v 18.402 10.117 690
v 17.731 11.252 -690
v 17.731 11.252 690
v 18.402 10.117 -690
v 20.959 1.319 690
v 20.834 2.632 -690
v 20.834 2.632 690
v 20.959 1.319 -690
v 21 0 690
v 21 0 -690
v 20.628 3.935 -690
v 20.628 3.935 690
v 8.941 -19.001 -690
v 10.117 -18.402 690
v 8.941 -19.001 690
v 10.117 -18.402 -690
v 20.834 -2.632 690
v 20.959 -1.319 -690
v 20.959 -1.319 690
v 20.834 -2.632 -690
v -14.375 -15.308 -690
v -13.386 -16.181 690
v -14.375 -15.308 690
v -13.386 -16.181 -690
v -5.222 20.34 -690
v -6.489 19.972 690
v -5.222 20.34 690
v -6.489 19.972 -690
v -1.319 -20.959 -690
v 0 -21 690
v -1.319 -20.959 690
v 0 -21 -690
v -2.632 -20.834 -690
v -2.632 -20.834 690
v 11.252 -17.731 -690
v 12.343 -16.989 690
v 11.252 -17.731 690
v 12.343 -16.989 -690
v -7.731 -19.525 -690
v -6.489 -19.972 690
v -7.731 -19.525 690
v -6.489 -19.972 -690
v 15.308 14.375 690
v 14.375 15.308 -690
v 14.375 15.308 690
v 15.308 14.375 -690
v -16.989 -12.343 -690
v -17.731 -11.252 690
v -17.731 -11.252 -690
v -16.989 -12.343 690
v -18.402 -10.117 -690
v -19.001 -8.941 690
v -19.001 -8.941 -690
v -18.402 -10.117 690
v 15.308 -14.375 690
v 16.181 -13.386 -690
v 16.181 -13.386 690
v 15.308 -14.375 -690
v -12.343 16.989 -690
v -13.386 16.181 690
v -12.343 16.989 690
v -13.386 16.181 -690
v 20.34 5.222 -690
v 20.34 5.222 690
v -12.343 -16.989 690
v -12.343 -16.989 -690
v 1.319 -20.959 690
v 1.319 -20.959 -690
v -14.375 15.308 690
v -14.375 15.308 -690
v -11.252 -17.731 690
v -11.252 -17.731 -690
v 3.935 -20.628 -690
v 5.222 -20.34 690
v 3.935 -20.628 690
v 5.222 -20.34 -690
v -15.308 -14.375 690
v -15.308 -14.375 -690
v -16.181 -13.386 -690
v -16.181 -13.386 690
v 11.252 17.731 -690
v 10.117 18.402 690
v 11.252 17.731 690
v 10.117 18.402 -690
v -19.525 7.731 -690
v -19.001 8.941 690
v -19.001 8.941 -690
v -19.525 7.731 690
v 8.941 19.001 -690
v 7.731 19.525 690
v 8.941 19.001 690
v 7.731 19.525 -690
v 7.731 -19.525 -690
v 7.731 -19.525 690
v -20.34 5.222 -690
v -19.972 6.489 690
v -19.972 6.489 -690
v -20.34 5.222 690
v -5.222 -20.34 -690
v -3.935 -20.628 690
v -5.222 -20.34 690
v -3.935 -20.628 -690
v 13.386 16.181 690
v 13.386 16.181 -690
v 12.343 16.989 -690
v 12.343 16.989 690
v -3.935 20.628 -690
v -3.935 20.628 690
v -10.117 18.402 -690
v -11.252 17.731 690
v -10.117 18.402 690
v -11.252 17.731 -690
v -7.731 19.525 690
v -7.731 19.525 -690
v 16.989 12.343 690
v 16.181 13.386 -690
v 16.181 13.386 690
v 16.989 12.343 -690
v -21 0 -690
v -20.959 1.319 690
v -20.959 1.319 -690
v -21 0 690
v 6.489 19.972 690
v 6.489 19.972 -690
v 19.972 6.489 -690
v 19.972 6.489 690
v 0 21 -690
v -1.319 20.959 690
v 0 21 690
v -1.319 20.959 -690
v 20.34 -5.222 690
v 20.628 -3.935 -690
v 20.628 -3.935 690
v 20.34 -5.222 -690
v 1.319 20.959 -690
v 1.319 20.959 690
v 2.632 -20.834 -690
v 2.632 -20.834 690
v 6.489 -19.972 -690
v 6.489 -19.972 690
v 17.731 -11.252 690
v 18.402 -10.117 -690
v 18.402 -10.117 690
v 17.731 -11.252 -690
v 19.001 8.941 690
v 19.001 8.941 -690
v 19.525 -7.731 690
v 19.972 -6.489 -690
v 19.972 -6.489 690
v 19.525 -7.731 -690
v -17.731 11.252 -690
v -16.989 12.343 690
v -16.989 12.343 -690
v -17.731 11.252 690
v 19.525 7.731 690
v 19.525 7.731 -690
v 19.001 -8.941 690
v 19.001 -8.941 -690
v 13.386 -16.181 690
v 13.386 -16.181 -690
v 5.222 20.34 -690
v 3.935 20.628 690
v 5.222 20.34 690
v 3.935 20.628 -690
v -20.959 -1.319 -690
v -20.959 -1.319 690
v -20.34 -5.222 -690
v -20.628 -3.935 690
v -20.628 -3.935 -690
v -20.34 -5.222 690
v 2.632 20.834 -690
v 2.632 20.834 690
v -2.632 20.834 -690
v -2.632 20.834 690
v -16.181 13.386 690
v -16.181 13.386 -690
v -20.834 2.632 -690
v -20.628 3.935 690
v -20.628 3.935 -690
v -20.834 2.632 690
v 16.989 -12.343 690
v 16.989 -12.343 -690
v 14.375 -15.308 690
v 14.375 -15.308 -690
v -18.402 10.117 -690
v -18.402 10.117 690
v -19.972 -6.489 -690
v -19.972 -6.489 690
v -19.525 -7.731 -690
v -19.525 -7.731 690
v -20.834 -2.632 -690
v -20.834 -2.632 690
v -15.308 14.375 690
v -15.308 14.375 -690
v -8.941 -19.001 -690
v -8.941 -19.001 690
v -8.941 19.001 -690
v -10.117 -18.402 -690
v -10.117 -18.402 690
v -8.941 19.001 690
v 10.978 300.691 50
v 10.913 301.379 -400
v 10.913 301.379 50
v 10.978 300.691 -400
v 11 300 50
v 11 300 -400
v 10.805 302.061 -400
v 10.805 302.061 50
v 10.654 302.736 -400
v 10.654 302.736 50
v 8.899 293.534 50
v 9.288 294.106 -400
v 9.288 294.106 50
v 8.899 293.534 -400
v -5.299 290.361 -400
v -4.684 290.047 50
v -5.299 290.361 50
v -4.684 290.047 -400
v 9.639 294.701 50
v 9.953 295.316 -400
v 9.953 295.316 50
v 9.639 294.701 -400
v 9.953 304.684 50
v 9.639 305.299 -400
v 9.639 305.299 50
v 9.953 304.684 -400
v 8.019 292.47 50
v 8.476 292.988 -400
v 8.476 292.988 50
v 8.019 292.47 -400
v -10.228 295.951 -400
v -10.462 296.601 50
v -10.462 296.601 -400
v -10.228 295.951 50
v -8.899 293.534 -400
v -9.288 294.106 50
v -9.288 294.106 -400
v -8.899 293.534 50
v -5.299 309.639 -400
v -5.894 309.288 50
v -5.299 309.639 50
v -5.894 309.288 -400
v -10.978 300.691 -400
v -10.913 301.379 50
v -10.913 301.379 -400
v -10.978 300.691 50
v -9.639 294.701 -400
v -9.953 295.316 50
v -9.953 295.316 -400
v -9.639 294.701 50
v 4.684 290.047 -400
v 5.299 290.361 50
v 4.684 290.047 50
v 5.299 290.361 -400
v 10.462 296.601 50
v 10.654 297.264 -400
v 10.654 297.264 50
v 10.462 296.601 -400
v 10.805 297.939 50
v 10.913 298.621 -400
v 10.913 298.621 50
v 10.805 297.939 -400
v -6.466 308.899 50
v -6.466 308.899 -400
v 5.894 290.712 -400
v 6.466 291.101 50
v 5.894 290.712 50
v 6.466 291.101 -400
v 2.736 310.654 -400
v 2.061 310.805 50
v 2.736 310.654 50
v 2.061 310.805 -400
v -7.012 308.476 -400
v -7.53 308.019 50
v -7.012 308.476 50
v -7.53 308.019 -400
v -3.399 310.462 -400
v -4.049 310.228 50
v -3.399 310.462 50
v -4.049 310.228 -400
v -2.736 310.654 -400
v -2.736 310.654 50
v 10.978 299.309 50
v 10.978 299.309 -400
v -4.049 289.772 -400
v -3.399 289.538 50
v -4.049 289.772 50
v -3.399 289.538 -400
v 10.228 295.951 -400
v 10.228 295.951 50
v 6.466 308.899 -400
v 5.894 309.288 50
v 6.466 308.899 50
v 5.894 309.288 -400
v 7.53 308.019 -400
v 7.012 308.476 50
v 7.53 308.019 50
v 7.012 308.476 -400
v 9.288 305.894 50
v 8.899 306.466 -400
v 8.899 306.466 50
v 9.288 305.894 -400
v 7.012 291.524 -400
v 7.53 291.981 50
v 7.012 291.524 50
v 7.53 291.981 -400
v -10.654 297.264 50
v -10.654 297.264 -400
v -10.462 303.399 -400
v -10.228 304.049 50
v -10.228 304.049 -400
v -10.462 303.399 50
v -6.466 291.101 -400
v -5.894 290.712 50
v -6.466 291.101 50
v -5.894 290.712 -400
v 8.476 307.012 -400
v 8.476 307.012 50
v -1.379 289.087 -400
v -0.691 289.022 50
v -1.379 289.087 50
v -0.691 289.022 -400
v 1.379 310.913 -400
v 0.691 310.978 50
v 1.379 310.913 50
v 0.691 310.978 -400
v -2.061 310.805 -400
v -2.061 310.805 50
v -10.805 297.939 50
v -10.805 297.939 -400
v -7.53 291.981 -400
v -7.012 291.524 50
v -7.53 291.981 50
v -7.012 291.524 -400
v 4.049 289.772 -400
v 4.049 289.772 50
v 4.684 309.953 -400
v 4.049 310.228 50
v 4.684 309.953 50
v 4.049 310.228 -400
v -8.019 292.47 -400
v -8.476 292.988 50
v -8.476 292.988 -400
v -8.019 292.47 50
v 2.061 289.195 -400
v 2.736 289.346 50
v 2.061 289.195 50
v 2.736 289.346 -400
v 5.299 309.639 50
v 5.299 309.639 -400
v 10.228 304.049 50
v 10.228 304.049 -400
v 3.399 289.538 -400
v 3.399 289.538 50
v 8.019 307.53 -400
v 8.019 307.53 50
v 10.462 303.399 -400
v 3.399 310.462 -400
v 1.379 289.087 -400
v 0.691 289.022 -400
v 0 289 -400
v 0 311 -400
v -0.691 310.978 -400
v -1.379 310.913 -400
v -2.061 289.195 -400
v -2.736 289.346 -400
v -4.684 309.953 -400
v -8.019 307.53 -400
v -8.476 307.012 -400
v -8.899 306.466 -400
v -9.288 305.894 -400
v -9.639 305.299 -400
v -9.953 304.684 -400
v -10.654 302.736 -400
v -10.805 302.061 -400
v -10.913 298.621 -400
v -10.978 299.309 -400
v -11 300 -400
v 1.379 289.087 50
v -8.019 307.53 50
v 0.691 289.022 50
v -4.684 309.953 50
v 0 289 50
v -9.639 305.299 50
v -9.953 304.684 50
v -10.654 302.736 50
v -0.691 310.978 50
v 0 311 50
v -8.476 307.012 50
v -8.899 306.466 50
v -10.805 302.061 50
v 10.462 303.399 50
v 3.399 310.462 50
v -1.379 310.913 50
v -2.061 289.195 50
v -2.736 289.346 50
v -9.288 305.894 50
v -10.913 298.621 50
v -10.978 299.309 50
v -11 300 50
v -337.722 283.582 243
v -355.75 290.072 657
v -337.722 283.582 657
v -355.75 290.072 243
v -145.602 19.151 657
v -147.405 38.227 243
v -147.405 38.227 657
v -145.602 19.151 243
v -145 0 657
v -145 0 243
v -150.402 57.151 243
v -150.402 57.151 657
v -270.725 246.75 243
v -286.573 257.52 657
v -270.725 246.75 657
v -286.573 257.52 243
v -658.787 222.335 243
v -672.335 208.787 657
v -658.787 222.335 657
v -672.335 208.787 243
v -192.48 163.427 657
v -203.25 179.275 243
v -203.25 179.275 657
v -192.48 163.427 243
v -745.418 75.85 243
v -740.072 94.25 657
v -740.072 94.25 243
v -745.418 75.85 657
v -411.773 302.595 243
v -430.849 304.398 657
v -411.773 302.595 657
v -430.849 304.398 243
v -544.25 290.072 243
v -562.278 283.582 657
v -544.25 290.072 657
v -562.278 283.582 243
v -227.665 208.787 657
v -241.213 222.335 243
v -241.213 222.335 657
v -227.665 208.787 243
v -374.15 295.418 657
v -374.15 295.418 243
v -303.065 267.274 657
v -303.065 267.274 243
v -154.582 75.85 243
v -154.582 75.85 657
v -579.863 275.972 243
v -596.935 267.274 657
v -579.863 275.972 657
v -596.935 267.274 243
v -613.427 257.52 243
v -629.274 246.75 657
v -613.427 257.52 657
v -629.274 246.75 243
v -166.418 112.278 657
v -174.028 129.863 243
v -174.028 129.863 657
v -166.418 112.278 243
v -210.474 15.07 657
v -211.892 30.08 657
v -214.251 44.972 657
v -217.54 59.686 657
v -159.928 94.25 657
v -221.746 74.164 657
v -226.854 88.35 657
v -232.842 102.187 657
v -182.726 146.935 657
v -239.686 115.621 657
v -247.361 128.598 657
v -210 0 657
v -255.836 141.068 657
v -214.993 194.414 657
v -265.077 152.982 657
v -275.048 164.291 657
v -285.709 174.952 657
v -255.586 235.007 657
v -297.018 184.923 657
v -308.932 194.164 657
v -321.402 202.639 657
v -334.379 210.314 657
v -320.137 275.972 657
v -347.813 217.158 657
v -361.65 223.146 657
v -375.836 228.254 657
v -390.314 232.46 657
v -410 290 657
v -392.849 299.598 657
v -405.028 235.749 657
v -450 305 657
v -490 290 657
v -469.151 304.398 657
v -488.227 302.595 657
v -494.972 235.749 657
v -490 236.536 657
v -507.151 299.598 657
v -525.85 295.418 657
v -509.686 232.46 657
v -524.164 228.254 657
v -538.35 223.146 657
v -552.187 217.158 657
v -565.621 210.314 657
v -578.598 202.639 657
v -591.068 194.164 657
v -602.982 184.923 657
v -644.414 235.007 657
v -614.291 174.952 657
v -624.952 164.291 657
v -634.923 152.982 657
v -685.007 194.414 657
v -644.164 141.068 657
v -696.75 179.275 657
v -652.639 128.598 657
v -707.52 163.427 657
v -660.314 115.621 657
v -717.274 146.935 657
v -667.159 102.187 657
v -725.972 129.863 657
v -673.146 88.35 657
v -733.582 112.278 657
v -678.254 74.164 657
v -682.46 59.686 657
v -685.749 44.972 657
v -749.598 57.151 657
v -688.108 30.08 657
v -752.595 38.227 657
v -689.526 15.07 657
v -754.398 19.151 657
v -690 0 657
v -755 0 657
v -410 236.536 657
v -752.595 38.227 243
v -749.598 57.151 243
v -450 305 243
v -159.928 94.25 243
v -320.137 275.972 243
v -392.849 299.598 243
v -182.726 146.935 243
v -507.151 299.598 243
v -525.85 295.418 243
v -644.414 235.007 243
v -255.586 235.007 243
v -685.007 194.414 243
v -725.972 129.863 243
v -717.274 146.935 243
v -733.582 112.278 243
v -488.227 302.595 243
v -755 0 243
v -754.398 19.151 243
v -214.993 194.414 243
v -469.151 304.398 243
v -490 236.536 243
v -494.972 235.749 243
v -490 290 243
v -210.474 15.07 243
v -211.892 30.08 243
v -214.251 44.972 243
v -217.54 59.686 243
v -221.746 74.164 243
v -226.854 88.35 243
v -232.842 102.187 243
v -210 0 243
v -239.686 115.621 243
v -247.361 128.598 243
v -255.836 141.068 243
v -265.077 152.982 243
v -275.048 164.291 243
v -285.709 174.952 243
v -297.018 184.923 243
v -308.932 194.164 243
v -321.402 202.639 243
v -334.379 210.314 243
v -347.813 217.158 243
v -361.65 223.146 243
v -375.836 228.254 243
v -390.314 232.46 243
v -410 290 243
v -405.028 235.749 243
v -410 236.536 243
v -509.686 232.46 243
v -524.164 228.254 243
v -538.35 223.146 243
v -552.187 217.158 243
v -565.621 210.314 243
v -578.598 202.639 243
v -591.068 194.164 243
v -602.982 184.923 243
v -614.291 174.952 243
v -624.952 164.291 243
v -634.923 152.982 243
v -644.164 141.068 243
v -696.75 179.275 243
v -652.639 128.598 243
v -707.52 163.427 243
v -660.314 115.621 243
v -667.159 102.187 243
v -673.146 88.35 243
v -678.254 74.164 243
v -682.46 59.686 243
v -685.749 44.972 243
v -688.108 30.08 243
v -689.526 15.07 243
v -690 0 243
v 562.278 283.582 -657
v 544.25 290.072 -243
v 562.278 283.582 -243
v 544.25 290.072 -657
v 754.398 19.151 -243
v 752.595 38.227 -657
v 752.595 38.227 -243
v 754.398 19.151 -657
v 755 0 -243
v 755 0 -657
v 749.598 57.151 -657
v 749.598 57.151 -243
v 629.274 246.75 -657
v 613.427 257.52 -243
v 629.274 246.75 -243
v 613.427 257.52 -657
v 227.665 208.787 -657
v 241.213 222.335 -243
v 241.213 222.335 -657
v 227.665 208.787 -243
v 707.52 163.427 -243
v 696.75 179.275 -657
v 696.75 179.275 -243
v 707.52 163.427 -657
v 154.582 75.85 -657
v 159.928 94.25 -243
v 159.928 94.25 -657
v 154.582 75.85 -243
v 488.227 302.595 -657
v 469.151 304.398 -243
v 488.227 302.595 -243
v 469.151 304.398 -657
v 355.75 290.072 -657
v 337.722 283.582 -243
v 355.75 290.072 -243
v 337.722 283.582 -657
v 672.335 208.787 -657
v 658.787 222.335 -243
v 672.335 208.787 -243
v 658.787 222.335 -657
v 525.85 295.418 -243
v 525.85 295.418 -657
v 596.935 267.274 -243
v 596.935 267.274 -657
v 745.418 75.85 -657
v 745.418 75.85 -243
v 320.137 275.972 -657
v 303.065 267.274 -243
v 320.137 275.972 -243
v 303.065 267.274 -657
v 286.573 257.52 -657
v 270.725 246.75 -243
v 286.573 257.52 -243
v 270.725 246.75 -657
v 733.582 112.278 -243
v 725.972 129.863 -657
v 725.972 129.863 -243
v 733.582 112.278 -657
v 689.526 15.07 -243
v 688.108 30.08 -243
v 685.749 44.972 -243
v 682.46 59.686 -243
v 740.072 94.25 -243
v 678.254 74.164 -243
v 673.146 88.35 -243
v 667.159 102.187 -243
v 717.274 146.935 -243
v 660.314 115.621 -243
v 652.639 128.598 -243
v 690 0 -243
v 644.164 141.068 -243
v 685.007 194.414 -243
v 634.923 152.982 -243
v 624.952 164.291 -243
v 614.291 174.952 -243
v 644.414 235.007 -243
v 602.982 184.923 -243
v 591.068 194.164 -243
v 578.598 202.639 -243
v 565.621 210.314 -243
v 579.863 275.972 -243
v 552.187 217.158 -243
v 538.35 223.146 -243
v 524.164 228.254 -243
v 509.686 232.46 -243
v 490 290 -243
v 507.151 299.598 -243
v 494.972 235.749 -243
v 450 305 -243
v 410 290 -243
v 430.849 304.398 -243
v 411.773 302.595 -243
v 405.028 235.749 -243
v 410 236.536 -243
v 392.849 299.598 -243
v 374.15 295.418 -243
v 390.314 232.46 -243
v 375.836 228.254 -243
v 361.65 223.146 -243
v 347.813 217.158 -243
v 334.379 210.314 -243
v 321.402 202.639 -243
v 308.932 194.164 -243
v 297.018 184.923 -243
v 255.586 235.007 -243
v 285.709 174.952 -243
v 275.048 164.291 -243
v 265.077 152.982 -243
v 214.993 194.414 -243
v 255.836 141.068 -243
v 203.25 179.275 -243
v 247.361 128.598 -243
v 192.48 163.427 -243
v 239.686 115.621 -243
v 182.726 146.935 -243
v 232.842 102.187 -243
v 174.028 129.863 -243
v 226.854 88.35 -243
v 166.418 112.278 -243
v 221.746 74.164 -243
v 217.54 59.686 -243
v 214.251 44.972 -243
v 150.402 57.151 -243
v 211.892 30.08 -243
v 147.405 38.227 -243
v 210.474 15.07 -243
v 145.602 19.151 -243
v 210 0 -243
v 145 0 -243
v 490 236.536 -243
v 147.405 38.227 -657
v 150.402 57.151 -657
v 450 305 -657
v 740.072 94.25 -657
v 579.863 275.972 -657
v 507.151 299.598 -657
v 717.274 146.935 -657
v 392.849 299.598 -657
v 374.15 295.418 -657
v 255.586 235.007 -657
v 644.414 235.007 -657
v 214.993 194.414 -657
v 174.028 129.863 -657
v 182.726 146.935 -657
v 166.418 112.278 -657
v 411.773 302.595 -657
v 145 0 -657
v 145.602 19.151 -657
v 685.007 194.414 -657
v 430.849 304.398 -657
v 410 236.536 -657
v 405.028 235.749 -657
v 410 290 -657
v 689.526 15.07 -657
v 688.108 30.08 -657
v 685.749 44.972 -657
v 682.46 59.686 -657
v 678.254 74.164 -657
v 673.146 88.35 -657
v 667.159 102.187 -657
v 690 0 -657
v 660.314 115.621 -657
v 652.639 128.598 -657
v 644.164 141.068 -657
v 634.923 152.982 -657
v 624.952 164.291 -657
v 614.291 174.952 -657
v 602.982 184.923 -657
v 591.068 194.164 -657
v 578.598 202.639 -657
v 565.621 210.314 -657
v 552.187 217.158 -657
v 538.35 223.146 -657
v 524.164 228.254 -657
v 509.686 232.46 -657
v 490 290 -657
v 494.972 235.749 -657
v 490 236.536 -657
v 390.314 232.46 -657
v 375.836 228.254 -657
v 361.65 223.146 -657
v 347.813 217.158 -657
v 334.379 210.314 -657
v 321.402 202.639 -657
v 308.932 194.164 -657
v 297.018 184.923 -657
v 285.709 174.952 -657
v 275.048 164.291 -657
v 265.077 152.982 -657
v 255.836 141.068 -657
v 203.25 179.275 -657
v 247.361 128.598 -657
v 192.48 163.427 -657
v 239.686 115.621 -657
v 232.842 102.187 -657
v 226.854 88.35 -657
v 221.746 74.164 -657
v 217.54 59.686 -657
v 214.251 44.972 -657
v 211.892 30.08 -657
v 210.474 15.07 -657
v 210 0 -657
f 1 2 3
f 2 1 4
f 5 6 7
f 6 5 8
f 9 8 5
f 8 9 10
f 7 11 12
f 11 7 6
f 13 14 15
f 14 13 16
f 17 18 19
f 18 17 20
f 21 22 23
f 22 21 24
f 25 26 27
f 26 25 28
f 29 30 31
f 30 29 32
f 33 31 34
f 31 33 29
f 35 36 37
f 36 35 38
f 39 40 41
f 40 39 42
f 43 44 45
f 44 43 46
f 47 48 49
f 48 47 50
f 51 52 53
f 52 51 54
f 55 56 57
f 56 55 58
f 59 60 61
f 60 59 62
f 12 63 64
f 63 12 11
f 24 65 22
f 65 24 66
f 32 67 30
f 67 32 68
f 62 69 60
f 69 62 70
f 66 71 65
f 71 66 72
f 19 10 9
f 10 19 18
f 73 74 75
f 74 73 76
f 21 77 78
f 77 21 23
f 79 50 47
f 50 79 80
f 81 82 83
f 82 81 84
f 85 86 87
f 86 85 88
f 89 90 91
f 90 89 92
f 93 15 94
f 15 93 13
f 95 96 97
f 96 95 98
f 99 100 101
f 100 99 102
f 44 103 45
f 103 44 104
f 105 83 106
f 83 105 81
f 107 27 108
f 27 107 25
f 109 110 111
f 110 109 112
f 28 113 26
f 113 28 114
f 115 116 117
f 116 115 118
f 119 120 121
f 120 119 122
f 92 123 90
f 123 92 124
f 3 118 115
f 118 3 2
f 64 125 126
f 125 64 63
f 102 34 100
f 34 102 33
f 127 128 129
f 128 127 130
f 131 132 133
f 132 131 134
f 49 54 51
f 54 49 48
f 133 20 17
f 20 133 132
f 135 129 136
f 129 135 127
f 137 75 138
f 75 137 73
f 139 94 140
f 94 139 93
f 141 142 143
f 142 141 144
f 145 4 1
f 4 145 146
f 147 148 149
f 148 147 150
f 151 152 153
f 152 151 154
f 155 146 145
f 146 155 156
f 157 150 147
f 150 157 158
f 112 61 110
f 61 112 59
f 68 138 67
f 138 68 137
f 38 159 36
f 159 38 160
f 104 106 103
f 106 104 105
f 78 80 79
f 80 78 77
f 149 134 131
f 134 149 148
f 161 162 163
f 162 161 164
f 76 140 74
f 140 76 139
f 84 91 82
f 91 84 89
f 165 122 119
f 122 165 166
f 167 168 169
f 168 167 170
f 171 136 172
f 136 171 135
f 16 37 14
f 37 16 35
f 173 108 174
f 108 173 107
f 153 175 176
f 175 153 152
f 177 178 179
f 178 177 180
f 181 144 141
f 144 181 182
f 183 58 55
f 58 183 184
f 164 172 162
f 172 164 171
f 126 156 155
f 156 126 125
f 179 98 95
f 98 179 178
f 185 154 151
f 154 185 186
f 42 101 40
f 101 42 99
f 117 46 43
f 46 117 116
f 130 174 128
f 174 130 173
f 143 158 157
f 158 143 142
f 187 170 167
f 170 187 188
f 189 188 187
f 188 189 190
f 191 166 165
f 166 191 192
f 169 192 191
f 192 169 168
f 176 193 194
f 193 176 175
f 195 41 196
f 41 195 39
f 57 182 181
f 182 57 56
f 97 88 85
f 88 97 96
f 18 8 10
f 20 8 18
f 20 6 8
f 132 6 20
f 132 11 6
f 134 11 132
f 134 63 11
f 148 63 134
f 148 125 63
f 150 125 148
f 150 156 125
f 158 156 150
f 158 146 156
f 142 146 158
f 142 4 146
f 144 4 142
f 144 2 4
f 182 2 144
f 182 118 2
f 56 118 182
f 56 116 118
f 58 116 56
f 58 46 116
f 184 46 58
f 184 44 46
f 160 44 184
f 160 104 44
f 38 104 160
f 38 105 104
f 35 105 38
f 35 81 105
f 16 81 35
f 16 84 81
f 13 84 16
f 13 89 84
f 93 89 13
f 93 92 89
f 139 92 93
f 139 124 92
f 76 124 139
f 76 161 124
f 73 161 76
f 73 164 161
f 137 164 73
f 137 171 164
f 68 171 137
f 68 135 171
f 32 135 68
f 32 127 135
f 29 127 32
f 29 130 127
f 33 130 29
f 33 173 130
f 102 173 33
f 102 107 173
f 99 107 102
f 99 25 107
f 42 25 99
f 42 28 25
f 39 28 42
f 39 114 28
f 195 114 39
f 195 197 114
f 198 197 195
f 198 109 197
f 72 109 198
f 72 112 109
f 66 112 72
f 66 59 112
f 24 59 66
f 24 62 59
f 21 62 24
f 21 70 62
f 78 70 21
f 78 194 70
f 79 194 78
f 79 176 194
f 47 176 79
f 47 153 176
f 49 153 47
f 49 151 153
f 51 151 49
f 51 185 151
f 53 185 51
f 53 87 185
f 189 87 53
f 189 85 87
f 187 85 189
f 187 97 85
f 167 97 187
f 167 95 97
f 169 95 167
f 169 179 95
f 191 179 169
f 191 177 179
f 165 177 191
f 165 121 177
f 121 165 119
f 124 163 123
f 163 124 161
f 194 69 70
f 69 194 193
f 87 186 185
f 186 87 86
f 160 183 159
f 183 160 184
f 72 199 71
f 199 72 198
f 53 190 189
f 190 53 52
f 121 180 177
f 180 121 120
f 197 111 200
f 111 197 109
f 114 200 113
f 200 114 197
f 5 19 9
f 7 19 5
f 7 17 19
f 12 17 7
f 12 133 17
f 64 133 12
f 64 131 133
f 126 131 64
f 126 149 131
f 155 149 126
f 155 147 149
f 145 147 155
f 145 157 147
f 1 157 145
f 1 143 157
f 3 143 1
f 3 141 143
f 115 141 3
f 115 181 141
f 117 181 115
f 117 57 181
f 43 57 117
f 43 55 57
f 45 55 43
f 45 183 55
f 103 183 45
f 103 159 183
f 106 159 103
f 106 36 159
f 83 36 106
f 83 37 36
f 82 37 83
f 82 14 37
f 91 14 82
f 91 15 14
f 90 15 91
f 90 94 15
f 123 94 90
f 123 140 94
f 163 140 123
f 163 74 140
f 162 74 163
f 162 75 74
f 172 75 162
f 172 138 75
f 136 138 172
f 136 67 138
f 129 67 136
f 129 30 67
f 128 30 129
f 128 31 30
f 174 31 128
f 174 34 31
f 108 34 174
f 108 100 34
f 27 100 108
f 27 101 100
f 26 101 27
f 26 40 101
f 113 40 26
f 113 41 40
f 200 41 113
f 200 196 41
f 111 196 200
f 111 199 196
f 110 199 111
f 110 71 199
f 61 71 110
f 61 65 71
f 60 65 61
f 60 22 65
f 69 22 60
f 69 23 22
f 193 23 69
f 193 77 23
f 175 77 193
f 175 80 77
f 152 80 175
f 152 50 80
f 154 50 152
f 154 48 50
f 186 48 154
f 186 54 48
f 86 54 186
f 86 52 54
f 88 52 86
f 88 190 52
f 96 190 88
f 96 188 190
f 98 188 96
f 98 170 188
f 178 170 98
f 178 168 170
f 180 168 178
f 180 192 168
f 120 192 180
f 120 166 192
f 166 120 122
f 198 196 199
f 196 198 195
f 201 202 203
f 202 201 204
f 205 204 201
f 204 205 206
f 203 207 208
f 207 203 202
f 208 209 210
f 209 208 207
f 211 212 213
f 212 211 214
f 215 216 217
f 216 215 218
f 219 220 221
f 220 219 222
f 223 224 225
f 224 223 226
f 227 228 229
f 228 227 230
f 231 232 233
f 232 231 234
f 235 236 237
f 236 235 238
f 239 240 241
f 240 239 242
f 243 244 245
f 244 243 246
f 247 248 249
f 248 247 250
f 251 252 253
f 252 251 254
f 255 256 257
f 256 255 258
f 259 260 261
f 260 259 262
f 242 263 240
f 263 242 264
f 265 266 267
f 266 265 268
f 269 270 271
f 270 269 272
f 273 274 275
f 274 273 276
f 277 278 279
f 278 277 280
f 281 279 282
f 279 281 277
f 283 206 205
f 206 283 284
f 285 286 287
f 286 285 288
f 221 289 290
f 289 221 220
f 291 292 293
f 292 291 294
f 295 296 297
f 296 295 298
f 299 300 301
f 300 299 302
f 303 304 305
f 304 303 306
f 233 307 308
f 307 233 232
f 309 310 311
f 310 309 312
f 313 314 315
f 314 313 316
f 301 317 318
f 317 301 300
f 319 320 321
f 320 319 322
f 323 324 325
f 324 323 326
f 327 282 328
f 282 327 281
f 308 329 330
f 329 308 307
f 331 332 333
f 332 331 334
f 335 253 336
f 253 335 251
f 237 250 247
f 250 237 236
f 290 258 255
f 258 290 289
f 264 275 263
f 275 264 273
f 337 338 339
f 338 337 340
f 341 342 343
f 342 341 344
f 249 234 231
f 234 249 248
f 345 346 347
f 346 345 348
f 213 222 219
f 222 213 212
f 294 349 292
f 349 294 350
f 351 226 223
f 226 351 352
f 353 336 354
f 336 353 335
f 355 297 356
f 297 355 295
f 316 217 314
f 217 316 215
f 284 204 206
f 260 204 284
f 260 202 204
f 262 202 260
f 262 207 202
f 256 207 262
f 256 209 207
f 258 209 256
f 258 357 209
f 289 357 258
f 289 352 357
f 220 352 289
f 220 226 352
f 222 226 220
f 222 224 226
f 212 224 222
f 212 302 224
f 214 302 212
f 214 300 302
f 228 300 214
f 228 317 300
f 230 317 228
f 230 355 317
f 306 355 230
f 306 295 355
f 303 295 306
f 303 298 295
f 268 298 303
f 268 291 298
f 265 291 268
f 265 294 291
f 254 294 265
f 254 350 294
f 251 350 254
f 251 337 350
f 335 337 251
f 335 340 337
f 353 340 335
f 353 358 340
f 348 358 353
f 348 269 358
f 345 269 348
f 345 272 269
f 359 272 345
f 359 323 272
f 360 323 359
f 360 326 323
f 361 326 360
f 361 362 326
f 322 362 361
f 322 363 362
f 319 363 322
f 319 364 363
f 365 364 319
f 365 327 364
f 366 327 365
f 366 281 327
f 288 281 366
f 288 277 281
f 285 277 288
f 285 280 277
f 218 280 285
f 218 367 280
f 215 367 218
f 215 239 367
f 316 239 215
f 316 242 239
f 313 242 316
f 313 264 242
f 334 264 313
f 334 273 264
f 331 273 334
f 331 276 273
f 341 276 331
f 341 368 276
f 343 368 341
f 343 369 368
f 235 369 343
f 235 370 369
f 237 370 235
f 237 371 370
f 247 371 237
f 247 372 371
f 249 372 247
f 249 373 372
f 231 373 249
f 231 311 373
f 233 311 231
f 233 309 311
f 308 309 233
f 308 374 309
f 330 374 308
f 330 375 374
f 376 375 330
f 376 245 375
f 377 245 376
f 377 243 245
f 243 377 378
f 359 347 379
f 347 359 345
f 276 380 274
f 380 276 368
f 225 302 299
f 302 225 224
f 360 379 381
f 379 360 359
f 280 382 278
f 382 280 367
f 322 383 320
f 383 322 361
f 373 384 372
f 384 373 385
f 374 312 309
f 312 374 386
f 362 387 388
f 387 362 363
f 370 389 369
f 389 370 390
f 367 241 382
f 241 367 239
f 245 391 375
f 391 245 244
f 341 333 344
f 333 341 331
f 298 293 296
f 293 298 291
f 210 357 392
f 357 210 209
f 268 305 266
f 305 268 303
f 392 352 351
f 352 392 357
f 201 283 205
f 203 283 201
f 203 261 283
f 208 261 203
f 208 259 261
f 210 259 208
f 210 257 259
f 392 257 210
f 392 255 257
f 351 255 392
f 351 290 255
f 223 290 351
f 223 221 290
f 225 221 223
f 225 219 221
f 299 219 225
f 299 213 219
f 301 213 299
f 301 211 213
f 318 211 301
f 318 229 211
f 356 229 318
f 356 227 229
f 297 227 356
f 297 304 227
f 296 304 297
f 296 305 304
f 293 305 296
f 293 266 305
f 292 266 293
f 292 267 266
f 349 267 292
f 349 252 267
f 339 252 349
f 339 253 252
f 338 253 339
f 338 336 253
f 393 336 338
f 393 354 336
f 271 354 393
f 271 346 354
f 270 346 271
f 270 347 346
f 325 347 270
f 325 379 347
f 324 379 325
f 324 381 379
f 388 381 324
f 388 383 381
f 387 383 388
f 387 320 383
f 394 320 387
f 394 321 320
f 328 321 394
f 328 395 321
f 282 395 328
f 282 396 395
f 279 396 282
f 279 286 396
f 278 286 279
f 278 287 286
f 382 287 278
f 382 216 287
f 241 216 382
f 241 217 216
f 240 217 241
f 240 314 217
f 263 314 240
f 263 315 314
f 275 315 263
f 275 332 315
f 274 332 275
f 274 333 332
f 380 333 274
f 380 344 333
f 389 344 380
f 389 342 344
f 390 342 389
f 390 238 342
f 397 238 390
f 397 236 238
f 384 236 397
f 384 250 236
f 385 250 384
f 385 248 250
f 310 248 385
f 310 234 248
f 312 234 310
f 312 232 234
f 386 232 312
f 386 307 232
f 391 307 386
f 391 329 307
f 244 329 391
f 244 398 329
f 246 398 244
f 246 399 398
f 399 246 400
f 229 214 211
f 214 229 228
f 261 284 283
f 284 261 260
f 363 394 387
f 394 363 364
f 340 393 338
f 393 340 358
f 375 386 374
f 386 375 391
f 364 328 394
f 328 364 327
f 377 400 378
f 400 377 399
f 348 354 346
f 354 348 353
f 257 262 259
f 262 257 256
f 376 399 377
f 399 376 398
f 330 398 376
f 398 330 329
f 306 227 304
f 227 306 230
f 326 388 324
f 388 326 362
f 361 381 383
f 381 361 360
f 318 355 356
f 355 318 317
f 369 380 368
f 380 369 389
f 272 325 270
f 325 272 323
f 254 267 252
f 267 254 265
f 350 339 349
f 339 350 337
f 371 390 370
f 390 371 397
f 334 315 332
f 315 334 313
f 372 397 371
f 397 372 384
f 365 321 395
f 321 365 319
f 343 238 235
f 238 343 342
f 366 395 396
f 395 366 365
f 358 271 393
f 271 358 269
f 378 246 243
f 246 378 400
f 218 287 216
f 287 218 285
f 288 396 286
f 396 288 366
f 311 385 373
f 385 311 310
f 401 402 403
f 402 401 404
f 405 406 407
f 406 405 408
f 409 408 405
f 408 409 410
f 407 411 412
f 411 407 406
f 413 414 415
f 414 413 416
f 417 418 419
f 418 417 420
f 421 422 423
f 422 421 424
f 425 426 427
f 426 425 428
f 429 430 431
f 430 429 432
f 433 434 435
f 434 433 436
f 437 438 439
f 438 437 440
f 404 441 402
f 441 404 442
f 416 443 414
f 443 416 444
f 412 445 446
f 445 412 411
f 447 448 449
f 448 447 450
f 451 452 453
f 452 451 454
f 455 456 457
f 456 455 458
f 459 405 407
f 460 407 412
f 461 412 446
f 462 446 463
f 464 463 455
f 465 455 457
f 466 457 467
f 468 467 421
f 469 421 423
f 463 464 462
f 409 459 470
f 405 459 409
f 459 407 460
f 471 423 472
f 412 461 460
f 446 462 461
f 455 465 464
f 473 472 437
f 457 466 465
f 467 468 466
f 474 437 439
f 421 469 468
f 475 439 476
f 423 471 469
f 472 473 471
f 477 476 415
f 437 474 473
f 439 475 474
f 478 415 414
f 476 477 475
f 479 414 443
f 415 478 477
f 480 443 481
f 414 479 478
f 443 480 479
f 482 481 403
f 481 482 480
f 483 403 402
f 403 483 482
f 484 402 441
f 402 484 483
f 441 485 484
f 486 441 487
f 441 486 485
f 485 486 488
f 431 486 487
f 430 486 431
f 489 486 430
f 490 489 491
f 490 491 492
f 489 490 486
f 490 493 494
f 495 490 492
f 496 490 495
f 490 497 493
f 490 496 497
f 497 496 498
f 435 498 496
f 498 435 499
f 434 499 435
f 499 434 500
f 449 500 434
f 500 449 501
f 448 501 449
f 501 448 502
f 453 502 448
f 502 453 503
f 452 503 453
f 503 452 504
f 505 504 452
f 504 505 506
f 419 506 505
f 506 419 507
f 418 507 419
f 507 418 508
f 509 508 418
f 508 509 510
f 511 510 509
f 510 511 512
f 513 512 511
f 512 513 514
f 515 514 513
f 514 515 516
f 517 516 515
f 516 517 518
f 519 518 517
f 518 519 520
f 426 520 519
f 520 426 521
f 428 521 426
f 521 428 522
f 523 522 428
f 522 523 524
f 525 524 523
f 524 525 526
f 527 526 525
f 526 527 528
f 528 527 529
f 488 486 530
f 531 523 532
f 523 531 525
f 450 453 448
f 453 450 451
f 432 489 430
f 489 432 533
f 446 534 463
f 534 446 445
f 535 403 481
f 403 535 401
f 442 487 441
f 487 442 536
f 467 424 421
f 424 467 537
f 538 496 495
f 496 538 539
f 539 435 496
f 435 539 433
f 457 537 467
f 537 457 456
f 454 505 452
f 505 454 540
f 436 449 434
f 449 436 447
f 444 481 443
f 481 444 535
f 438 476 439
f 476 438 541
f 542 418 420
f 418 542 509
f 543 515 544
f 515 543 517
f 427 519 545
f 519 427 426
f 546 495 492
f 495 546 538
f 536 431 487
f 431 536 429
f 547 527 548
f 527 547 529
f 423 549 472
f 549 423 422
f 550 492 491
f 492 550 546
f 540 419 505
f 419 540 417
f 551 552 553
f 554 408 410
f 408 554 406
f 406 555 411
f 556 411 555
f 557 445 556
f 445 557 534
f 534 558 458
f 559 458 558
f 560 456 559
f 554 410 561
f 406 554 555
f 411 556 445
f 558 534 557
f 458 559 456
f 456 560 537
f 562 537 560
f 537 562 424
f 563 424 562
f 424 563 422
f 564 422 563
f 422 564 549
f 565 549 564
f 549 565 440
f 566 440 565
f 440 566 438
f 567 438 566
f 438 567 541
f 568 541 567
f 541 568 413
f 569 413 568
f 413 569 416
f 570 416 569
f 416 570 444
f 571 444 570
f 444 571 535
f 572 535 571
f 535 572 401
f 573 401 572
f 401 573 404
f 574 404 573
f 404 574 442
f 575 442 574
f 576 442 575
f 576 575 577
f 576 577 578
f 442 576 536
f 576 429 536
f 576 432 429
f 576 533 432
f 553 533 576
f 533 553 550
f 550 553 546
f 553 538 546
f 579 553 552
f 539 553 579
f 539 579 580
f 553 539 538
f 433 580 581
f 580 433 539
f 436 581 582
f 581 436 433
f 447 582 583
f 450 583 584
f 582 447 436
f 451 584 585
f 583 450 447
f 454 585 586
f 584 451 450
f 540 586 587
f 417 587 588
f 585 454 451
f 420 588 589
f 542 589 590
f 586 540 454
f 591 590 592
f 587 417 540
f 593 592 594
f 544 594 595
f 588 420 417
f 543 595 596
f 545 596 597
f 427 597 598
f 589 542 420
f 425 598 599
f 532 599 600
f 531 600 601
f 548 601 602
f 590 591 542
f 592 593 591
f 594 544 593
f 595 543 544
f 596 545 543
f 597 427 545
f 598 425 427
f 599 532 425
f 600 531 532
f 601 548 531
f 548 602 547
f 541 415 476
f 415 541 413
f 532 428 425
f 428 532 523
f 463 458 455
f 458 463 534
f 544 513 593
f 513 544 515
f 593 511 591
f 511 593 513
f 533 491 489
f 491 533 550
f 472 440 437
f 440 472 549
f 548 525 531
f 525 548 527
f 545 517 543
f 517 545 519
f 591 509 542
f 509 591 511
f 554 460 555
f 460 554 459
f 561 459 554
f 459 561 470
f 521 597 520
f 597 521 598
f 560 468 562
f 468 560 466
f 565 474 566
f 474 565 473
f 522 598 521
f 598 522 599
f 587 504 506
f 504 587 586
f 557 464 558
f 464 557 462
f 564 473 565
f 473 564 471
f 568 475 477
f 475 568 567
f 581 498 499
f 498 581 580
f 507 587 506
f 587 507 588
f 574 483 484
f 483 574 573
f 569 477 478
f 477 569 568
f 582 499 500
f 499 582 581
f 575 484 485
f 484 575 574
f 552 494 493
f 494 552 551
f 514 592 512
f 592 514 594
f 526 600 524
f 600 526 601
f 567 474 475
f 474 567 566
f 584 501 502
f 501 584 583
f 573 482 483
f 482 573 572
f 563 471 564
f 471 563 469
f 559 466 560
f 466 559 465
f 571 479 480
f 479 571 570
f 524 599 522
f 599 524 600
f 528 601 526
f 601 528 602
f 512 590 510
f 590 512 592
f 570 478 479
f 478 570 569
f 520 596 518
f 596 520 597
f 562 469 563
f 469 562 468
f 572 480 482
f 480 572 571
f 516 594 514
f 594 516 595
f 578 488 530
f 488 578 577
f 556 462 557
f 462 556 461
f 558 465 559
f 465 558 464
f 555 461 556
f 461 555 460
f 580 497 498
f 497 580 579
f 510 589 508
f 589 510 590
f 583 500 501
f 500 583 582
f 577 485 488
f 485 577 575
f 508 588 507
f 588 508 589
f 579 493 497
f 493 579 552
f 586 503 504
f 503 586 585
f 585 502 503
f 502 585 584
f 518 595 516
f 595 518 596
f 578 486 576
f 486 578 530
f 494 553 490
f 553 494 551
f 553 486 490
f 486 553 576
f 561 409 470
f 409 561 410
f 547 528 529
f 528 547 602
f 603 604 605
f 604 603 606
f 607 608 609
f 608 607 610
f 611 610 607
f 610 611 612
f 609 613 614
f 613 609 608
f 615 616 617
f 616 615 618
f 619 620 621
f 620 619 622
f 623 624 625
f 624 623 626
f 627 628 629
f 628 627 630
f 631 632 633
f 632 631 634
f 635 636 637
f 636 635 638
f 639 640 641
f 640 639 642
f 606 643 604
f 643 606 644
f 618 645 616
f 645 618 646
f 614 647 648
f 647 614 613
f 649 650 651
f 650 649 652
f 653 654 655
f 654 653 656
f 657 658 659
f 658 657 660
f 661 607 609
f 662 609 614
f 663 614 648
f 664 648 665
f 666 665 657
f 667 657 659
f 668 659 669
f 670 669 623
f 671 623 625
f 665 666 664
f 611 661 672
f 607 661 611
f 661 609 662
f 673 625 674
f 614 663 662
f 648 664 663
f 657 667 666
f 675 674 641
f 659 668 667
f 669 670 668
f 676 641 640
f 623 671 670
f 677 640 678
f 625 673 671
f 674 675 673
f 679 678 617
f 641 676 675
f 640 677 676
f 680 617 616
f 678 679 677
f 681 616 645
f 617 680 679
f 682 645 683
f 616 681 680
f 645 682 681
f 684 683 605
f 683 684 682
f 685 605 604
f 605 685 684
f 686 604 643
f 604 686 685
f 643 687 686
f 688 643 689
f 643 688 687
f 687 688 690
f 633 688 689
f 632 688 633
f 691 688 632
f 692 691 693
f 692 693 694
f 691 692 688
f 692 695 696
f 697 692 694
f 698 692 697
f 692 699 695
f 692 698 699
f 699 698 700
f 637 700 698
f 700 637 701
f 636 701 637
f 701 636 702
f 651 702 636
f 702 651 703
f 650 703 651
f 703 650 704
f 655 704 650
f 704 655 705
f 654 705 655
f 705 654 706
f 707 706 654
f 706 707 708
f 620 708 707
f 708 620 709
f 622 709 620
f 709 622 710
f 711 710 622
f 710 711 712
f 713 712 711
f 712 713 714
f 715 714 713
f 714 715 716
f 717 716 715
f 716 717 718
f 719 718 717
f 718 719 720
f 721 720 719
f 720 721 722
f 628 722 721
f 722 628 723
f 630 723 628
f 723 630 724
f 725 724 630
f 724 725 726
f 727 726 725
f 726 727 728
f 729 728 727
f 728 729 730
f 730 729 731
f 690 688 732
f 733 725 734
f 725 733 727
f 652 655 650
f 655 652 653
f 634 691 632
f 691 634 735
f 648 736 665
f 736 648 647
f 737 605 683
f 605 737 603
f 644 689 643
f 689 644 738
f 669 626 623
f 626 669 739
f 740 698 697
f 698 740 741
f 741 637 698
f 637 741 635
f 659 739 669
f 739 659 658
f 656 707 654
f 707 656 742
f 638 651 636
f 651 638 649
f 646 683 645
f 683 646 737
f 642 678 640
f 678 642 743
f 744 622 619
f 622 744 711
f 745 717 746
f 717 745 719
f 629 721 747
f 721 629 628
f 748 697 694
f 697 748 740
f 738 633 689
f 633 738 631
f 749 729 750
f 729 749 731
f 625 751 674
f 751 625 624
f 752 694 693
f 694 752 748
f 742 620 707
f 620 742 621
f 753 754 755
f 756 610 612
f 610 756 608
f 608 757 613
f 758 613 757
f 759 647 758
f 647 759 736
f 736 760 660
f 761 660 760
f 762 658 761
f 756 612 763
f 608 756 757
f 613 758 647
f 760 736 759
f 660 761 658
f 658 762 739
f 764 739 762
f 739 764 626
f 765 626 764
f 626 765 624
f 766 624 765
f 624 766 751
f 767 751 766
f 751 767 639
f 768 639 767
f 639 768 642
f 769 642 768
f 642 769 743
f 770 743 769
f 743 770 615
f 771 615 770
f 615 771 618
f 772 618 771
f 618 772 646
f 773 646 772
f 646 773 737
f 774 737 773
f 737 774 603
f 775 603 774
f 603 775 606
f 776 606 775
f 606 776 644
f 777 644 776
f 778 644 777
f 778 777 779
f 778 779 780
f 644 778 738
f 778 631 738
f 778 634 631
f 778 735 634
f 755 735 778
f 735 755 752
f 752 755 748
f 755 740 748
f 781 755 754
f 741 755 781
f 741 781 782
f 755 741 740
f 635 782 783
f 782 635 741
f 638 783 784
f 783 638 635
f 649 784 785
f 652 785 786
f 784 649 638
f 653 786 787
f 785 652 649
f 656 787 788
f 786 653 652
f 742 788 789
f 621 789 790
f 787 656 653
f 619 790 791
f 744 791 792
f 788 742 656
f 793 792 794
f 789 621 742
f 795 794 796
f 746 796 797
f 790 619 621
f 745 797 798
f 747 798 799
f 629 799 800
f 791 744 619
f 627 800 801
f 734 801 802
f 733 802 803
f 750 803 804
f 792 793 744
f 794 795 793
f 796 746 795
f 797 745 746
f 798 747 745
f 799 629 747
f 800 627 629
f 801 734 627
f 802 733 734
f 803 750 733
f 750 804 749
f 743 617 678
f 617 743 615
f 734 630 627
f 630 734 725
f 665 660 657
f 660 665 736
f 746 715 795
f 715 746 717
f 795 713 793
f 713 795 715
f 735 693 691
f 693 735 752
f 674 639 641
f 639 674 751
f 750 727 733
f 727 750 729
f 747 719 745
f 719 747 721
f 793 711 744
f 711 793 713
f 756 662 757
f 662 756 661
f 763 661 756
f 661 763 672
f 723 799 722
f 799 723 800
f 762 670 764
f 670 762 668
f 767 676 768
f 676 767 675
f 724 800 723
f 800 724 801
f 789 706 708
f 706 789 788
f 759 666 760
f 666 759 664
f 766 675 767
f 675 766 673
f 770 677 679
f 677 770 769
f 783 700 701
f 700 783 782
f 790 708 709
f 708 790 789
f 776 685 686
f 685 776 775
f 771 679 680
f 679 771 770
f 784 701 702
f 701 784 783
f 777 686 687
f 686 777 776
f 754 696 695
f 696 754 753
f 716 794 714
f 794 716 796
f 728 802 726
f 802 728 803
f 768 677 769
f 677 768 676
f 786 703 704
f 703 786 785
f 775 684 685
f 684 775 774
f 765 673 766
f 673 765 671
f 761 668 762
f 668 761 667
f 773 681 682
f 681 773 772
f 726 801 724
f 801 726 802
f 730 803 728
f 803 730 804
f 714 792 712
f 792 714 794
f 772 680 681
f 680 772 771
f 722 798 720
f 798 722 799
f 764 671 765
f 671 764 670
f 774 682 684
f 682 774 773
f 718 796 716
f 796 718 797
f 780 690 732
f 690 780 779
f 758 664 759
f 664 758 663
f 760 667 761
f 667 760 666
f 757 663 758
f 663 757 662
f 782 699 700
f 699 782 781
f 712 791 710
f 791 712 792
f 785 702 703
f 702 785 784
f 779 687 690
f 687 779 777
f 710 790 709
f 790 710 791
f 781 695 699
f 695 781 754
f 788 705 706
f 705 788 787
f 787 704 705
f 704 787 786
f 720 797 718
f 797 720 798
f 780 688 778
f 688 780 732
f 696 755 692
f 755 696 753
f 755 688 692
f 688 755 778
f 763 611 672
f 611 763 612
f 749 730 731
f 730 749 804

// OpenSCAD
// ============================================================================
// PROJECT: XXXG-00W0 WING GUNDAM ZERO EW - SHOULDER INNER BACKBONE INFRA
// COMPONENT VAULT: BANDAI CAST RUNNER G - SHOULDER BLOCKS G11 & G12
// PACKAGING RE-ARCHITECTURE: SUB-ARMOR CAPACITOR RECESSED BANK INTEGRATION
// CONFIG METRIC: SCALED TITANIUM CASTS WITH CYCLOIDAL SLOTS (1:1 ACTUAL METRIC)
// ============================================================================

$fn = 100; // High-precision circular resolution segment count

// Structural Constants Scaled 1:1 for a 16.7-Meter Airframe Scale (mm)
block_total_length = 920;                // Total longitudinal vertical height (mm)
pivot_bore_diameter = 480;               // Core cycloidal stabilizer pin width (mm)
armor_skin_thickness = 65;              // Solid TiAl protective plating wall (mm)
harness_conduit_width = 80;             // Cast-in 4oz copper logic trace track (mm)
capacitor_pocket_depth = 15;            // Sub-armor recessed housing pocket depth (mm)
capacitor_pocket_width = 140;           // Transverse MLCC array pocket width (mm)

module Runner_G_Shoulder_Block_Forge() {
    // Central Supply Injection Runner Axis (Molten Feed Line from Siphon Forge)
    color([0.22, 0.22, 0.25]) {
        cylinder(h = block_total_length * 1.5, d = 42, center = true);
        // Direct injection gates tracking straight into the part mold cavities
        translate() rotate() cylinder(h = 350, d = 22);
        translate([0, 300, -400]) rotate() cylinder(h = 450, d = 22);
    }
    
    // Instantiate Scaled Skeutomorphic Part Molds Symmetrically (Left & Right)
    Cast_Internal_Shoulder_Blocks();
}

module Cast_Internal_Shoulder_Blocks() {
    // ---- PART G11: INTERNAL LEFT STRUCTURAL UPPER SHOULDER ARTICULATION BLOCK ----
    translate([-450, 0, 450]) color([0.35, 0.35, 0.38]) { // Inner Frame Dark Spec
        difference() {
            // Main solid heavy-duty core joint connection block segment
            cylinder(h = block_total_length * 0.45, d = pivot_bore_diameter + (armor_skin_thickness * 2), center = true);
            
            // Central Cycloidal Reduction Track Bore (Houses pre-loaded alignment pins)
            cylinder(h = block_total_length * 0.5, d = pivot_bore_diameter, center = true);
            
            // SUB-ARMOR RECESSED CAPACITOR POCKETS [Segmented rows cut inside the armor inner wall]
            for (z_offset = [-120, 0, 120]) {
                translate([0, (pivot_bore_diameter/2 - armor_skin_thickness + capacitor_pocket_depth/2), z_offset])
                    cube([capacitor_pocket_width, capacitor_pocket_depth, 100], center = true);
            }
            
            // Continuous cast-in routing track for the 4oz solid-state wiring rails
            cube([harness_conduit_width, pivot_bore_diameter + 100, block_total_length], center = true);
            
            // Slicing profile tool to generate an asymmetrical half-shell part component
            translate([0, -pivot_bore_diameter, 0])
                cube([pivot_bore_diameter * 2, pivot_bore_diameter * 2, block_total_length * 2], center = true);
        }
    }
    
    // ---- PART G12: INTERNAL RIGHT STRUCTURAL UPPER SHOULDER ARTICULATION BLOCK ----
    translate([450, 0, -450]) rotate() color([0.35, 0.35, 0.38]) {
        difference() {
            cylinder(h = block_total_length * 0.45, d = pivot_bore_diameter + (armor_skin_thickness * 2), center = true);
            cylinder(h = block_total_length * 0.5, d = pivot_bore_diameter, center = true);
            
            for (z_offset = [-120, 0, 120]) {
                translate([0, (pivot_bore_diameter/2 - armor_skin_thickness + capacitor_pocket_depth/2), z_offset])
                    cube([capacitor_pocket_width, capacitor_pocket_depth, 100], center = true);
            }
            
            cube([harness_conduit_width, pivot_bore_diameter + 100, block_total_length], center = true);
            translate([0, -pivot_bore_diameter, 0])
                cube([pivot_bore_diameter * 2, pivot_bore_diameter * 2, block_total_length * 2], center = true);
        }
    }
}

// Render Master Assembly to Parameter Workspace
Runner_G_Shoulder_Block_Forge();
